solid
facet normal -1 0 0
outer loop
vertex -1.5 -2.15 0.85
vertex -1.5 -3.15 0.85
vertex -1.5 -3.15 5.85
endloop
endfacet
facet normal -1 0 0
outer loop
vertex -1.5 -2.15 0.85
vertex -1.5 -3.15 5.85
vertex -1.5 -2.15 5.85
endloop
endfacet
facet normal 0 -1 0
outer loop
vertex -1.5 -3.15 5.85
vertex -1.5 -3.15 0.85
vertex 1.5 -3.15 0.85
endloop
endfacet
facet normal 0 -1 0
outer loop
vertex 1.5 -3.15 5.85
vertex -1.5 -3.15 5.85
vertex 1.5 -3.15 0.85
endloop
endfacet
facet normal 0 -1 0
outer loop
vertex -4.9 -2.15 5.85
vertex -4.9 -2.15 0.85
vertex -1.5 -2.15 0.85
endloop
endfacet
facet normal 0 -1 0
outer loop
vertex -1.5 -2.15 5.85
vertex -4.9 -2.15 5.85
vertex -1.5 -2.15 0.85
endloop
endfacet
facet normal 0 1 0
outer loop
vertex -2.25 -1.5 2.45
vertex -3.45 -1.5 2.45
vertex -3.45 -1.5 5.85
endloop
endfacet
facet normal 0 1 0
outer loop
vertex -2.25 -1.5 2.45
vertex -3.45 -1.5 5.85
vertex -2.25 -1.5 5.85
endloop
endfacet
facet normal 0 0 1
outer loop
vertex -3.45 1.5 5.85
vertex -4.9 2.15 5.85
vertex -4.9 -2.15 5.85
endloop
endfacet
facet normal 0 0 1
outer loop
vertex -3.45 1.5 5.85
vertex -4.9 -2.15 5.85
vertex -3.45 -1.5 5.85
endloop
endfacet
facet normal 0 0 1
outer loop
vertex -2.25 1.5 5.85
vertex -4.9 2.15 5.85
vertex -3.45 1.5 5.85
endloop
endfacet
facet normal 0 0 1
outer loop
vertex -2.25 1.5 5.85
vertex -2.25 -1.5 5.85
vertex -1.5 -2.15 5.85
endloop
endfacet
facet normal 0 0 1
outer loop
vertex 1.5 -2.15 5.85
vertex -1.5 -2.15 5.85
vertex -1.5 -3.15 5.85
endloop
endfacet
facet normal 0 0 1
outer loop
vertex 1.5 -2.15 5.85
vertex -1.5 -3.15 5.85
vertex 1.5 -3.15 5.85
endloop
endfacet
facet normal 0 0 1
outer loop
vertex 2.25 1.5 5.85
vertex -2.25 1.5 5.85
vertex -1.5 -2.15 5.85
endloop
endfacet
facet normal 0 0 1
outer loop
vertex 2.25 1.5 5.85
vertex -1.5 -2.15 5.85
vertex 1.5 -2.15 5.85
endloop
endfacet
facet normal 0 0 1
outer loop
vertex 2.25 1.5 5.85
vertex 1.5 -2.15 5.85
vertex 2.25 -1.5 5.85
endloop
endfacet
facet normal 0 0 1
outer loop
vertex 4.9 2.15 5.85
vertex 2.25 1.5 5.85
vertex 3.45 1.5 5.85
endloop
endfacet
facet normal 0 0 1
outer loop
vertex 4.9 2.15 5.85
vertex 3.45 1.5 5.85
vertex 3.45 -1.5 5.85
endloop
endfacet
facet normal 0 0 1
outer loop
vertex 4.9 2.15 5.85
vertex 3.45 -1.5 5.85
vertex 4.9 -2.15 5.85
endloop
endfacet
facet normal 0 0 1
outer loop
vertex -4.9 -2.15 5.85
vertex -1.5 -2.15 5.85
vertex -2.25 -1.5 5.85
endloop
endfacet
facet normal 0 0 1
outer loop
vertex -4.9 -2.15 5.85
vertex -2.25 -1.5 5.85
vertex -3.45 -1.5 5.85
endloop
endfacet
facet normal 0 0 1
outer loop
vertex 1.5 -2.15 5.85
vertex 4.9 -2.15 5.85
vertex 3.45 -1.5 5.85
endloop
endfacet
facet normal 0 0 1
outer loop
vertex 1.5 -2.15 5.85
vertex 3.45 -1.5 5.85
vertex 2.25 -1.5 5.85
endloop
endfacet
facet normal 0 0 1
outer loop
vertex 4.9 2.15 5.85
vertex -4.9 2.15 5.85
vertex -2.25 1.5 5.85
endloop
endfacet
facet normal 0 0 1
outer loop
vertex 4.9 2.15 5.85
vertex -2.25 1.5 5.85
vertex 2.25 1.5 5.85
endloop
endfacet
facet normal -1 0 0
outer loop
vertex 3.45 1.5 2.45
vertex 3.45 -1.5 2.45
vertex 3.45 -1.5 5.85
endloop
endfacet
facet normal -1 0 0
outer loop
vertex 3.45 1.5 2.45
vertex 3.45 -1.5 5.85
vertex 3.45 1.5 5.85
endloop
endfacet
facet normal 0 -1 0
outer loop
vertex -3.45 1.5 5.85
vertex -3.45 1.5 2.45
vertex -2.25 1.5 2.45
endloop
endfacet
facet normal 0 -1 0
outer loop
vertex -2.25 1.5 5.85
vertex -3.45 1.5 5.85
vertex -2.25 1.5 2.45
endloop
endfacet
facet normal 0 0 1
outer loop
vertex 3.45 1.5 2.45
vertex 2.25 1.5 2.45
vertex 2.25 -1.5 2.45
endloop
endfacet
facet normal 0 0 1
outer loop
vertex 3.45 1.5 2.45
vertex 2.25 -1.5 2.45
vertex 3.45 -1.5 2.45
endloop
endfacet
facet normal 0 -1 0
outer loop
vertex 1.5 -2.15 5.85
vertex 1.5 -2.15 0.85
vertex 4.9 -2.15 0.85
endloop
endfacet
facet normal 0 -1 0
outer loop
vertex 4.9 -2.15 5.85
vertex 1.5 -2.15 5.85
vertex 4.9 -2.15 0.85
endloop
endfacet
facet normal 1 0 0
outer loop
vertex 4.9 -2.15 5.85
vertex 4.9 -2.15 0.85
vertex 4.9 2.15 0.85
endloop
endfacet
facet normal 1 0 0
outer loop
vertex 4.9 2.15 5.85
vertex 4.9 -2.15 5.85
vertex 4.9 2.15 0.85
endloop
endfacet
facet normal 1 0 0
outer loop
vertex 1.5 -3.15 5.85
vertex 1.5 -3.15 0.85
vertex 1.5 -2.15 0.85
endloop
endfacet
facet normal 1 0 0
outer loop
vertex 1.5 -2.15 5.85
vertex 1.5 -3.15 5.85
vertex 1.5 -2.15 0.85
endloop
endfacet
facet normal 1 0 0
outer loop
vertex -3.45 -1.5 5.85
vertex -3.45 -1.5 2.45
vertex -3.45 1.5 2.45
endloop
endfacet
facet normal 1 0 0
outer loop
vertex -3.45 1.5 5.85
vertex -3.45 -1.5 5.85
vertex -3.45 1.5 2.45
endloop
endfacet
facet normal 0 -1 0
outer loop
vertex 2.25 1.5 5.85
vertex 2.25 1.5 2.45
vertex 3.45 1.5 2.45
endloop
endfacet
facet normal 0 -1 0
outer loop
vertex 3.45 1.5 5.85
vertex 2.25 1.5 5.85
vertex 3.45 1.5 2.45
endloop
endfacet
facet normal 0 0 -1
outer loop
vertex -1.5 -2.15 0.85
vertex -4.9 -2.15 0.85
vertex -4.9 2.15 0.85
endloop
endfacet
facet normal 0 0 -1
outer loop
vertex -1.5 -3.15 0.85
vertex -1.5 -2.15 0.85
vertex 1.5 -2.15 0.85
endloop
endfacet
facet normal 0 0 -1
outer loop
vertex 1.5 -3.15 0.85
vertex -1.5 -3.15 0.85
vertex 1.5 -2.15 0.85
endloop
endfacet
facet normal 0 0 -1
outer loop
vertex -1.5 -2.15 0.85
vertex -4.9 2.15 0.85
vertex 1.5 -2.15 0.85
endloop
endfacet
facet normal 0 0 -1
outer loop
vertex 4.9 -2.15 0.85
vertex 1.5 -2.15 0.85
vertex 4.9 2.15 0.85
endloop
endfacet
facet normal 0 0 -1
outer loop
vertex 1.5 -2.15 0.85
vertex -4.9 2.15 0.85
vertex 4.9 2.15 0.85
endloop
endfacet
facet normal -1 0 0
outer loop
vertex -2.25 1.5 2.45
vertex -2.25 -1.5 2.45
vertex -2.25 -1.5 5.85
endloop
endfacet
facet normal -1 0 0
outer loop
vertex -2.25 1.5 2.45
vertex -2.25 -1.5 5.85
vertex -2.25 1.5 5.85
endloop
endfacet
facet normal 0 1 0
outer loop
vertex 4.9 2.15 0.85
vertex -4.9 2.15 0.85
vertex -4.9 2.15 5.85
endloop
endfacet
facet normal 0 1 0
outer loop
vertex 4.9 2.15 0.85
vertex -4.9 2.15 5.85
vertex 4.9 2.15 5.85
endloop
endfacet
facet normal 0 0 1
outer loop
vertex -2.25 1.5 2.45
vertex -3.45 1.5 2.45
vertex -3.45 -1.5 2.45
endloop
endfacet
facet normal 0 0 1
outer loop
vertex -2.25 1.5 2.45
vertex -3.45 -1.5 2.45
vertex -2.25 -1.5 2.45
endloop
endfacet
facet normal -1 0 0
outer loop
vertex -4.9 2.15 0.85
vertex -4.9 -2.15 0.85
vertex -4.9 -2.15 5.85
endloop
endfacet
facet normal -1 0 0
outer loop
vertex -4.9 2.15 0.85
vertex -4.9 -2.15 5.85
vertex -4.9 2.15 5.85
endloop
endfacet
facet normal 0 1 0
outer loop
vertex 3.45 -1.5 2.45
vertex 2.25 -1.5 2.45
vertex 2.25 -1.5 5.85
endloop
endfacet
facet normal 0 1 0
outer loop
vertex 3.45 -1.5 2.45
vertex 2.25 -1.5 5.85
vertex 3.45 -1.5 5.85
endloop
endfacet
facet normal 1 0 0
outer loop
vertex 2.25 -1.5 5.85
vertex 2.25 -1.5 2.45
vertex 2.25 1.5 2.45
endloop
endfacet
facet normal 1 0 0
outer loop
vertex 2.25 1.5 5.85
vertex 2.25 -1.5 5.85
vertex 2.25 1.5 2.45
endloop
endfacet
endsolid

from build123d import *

# Parameters (mm, degrees)
BOX019_W     = 1.2
BOX019_H     = 3
BOX019_DEPTH = 3.4
BOX020_W     = 1.2
BOX020_H     = 3
BOX020_DEPTH = 3.4
BOX018_W     = 9.8
BOX018_H     = 4.3
BOX018_DEPTH = 5
BOX017_W     = 3
BOX017_H     = 1
BOX017_DEPTH = 5


with BuildPart() as pg1232_hole1:
    # Box019 → Box019 (new body)
    with BuildSketch(Plane(origin=(-3.45, -1.5, 2.45), x_dir=(1, 0, 0), z_dir=(0, 0, 1))):
        with Locations((0.6, 1.5)):
            Rectangle(BOX019_W, BOX019_H)
    extrude(amount=BOX019_DEPTH)


with BuildPart() as pg1232_hole:
    # Box020 → Box020 (new body)
    with BuildSketch(Plane(origin=(2.25, -1.5, 2.45), x_dir=(1, 0, 0), z_dir=(0, 0, 1))):
        with Locations((0.6, 1.5)):
            Rectangle(BOX020_W, BOX020_H)
    extrude(amount=BOX020_DEPTH)

    # Fusion002: union PG1232_Hole1
    add(pg1232_hole1.part)


with BuildPart() as pg1232_stemmain:
    # Box018 → Box018 (new body)
    with BuildSketch(Plane(origin=(-4.9, -2.15, 0.85), x_dir=(1, 0, 0), z_dir=(0, 0, 1))):
        with Locations((4.9, 2.15)):
            Rectangle(BOX018_W, BOX018_H)
    extrude(amount=BOX018_DEPTH)


with BuildPart() as pg1232_stem:
    # Box017 → Box017 (new body)
    with BuildSketch(Plane(origin=(-1.5, -3.15, 0.85), x_dir=(1, 0, 0), z_dir=(0, 0, 1))):
        with Locations((1.5, 0.5)):
            Rectangle(BOX017_W, BOX017_H)
    extrude(amount=BOX017_DEPTH)

    # Fusion003: union PG1232_StemMain
    add(pg1232_stemmain.part)

    # Cut002: cut PG1232_Hole
    add(pg1232_hole.part, mode=Mode.SUBTRACT)


solid = pg1232_stem.part
